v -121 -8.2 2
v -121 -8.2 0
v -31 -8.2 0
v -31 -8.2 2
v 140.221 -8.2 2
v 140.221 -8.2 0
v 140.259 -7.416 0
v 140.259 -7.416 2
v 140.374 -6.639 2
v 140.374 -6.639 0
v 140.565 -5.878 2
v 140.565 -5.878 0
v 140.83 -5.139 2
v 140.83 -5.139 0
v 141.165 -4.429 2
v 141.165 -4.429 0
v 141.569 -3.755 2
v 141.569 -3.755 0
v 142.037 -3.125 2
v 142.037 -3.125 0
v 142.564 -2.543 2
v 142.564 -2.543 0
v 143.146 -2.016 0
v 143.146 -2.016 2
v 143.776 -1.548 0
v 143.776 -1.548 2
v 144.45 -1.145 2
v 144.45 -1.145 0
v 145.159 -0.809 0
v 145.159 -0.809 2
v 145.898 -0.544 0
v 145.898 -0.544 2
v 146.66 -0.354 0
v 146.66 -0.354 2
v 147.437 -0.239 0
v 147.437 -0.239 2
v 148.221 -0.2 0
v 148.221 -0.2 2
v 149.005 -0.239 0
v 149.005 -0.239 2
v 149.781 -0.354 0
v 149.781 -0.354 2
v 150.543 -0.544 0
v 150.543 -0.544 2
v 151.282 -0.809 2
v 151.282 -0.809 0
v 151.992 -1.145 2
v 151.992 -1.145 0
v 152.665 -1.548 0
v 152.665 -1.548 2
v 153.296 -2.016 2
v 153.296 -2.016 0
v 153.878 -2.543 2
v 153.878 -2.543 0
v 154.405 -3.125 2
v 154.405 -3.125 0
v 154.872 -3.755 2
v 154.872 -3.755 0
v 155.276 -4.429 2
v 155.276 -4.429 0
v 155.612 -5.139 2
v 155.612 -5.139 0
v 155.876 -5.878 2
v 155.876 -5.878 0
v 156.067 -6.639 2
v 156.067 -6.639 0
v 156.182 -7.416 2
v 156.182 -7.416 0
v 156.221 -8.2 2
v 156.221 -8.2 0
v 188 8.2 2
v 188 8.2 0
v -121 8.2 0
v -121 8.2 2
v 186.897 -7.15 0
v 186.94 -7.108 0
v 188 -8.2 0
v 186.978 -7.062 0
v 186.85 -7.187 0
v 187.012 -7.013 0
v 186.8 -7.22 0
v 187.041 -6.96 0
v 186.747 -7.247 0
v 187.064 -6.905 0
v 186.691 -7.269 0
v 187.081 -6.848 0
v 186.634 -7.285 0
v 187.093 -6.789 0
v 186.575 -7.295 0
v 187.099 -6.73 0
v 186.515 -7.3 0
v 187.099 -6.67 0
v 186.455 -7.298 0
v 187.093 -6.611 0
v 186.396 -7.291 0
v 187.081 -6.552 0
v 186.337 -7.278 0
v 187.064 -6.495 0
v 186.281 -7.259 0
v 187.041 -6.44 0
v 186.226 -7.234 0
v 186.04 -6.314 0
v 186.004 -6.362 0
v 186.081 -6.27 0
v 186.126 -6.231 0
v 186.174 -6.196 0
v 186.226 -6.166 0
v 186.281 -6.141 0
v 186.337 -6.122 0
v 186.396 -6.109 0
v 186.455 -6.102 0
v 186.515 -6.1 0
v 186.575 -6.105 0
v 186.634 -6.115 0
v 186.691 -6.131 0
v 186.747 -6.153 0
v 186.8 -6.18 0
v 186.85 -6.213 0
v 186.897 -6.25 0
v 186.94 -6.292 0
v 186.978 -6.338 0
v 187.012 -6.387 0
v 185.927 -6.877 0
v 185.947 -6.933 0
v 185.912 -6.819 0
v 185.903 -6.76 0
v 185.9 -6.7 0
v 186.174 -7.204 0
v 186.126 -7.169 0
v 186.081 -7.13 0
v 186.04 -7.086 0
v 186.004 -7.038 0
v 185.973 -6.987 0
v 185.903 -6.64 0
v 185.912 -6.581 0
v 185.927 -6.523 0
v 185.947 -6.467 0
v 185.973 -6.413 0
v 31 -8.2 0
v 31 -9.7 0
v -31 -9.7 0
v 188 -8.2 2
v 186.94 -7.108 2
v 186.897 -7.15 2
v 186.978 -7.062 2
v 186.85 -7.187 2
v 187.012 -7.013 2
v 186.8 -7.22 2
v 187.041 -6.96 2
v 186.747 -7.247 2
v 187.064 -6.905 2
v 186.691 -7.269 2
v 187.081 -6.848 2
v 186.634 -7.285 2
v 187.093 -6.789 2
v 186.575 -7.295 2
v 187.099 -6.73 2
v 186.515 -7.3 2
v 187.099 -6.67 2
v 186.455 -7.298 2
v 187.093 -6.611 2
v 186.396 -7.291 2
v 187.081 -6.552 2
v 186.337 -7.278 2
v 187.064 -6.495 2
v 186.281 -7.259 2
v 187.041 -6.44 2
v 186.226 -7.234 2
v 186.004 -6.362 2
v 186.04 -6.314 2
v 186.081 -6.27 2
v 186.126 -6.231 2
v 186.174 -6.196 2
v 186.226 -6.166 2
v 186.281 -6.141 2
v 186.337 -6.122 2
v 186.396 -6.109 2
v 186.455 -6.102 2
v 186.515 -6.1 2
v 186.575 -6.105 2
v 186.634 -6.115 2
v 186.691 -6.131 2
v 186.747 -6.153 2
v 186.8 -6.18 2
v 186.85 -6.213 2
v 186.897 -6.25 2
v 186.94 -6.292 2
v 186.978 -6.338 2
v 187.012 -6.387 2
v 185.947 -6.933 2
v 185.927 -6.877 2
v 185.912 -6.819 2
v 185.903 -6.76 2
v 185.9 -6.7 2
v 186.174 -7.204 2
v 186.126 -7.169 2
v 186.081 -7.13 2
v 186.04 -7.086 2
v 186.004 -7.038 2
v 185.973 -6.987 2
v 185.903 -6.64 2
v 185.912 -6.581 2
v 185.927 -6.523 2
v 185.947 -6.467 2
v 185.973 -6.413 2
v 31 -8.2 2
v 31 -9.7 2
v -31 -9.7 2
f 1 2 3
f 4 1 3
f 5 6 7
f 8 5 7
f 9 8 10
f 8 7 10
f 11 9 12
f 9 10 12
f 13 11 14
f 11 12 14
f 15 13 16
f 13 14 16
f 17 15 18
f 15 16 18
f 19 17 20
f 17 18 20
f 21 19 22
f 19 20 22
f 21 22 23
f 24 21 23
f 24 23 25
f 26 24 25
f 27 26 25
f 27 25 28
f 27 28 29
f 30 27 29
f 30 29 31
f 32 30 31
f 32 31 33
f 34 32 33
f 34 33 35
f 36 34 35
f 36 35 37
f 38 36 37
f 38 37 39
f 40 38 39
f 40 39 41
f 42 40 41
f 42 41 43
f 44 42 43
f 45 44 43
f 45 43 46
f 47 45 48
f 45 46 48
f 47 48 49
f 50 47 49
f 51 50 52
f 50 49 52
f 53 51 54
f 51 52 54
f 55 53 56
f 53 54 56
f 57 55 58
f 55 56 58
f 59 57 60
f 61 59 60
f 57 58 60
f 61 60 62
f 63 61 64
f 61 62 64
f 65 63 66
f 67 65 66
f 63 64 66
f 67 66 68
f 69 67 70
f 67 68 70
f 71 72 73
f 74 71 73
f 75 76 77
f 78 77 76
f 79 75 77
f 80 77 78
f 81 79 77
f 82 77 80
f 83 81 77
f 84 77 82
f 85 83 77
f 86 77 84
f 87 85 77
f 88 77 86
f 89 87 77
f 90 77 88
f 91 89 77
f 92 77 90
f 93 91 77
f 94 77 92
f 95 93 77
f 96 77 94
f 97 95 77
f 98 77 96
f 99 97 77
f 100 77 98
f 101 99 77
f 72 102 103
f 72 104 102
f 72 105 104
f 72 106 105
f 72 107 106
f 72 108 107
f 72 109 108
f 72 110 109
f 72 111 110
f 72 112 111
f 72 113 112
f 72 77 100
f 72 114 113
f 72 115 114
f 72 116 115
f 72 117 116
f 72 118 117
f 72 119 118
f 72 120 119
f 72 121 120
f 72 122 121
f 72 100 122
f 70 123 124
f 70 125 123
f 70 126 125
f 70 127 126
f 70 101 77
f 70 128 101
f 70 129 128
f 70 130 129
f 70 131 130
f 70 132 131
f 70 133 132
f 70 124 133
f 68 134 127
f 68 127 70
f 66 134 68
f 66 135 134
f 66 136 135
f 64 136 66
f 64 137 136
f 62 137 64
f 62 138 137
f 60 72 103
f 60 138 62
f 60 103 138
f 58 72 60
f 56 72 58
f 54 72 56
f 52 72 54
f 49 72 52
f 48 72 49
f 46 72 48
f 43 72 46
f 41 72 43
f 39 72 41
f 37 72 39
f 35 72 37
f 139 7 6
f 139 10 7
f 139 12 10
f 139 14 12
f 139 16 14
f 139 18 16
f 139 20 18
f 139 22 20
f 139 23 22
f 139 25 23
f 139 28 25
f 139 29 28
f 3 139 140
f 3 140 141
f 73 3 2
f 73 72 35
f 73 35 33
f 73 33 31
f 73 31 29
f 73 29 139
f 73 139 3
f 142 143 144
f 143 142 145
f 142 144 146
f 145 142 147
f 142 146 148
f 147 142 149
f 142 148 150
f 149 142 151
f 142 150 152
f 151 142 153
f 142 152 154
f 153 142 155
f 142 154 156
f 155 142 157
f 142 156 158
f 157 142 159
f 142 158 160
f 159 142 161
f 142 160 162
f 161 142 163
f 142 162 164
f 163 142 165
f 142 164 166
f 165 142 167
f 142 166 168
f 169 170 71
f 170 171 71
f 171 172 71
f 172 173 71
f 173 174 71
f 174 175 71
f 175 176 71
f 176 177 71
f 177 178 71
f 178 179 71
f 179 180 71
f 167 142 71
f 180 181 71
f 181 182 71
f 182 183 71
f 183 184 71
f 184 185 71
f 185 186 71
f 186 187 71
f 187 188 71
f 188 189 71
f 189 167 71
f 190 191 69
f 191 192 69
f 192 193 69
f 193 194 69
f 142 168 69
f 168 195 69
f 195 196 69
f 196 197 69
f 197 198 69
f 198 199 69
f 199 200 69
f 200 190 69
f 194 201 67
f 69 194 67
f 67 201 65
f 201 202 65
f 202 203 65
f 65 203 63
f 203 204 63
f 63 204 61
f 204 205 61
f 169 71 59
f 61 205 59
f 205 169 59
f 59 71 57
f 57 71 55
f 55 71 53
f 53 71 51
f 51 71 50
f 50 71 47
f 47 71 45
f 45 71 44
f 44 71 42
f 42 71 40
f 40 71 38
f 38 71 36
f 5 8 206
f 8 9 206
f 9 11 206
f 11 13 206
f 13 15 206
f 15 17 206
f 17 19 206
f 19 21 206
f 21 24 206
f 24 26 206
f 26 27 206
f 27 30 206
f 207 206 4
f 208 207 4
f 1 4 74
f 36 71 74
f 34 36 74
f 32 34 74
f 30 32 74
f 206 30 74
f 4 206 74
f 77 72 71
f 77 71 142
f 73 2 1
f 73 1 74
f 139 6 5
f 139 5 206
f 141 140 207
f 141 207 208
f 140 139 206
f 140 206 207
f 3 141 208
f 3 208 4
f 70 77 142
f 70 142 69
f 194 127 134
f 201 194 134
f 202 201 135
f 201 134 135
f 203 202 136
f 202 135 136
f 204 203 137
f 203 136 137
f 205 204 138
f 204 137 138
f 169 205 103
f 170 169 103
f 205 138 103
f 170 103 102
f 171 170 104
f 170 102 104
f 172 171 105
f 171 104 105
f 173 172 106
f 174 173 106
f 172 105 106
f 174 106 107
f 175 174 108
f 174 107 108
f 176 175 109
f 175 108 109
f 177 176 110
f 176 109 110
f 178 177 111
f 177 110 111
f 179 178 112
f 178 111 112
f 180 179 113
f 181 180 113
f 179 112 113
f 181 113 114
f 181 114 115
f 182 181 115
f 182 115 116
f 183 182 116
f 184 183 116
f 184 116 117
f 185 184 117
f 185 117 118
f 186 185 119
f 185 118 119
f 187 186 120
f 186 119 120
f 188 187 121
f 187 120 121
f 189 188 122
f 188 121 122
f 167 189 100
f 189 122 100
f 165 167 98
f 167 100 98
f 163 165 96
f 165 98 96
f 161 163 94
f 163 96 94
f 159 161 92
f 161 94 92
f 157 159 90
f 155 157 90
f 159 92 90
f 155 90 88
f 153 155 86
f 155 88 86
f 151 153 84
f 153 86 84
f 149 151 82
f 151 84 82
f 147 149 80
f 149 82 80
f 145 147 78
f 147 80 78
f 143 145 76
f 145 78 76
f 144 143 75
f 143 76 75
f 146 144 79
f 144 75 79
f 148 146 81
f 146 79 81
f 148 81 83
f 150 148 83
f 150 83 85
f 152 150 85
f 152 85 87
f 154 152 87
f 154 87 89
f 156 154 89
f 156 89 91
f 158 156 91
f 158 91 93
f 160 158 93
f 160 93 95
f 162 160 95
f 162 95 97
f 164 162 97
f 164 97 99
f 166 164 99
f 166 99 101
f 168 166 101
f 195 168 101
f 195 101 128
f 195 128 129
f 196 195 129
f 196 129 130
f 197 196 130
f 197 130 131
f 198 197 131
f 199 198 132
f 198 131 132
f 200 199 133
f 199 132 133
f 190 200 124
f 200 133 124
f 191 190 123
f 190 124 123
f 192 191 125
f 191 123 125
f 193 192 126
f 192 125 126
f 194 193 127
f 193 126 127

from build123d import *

# Parameters (mm, degrees)
DODANIE_WYCI_GNI_CIE1_DEPTH = 2
SZKIC2_R                    = 0.6
SZKIC2_R_2                  = 8
WYTNIJ_WYCI_GNI_CIE1_DEPTH  = 2


with BuildPart() as part:
    # Szkic1 → Dodanie-wyciągnięcie1 (new body)
    with BuildSketch(Plane.XY):
        Polygon((-111, 8.2), (188, 8.2), (188, -8.2), (31, -8.2), (31, -9.7), (-31, -9.7), (-31, -8.2), (-111, -8.2), (-121, -8.2), (-121, 8.2), align=None)
    extrude(amount=DODANIE_WYCI_GNI_CIE1_DEPTH)

    # Szkic2 → Wytnij-wyciągnięcie1 (cut)
    with BuildSketch(Plane(origin=(0, 0, 0), x_dir=(-1, 0, 0), z_dir=(0, 0, -1))):
        with Locations((-186.5, -6.7)):
            Circle(SZKIC2_R)
        with Locations((-186.5, 11.2)):
            Circle(SZKIC2_R)
        with Locations((186.5, 11.2)):
            Circle(SZKIC2_R)
        with Locations((186.5, -11.2)):
            Circle(SZKIC2_R)
        with Locations((-148.220730504, -8.2)):
            Circle(SZKIC2_R_2)
    extrude(amount=-WYTNIJ_WYCI_GNI_CIE1_DEPTH, mode=Mode.SUBTRACT)


solid = part.part
